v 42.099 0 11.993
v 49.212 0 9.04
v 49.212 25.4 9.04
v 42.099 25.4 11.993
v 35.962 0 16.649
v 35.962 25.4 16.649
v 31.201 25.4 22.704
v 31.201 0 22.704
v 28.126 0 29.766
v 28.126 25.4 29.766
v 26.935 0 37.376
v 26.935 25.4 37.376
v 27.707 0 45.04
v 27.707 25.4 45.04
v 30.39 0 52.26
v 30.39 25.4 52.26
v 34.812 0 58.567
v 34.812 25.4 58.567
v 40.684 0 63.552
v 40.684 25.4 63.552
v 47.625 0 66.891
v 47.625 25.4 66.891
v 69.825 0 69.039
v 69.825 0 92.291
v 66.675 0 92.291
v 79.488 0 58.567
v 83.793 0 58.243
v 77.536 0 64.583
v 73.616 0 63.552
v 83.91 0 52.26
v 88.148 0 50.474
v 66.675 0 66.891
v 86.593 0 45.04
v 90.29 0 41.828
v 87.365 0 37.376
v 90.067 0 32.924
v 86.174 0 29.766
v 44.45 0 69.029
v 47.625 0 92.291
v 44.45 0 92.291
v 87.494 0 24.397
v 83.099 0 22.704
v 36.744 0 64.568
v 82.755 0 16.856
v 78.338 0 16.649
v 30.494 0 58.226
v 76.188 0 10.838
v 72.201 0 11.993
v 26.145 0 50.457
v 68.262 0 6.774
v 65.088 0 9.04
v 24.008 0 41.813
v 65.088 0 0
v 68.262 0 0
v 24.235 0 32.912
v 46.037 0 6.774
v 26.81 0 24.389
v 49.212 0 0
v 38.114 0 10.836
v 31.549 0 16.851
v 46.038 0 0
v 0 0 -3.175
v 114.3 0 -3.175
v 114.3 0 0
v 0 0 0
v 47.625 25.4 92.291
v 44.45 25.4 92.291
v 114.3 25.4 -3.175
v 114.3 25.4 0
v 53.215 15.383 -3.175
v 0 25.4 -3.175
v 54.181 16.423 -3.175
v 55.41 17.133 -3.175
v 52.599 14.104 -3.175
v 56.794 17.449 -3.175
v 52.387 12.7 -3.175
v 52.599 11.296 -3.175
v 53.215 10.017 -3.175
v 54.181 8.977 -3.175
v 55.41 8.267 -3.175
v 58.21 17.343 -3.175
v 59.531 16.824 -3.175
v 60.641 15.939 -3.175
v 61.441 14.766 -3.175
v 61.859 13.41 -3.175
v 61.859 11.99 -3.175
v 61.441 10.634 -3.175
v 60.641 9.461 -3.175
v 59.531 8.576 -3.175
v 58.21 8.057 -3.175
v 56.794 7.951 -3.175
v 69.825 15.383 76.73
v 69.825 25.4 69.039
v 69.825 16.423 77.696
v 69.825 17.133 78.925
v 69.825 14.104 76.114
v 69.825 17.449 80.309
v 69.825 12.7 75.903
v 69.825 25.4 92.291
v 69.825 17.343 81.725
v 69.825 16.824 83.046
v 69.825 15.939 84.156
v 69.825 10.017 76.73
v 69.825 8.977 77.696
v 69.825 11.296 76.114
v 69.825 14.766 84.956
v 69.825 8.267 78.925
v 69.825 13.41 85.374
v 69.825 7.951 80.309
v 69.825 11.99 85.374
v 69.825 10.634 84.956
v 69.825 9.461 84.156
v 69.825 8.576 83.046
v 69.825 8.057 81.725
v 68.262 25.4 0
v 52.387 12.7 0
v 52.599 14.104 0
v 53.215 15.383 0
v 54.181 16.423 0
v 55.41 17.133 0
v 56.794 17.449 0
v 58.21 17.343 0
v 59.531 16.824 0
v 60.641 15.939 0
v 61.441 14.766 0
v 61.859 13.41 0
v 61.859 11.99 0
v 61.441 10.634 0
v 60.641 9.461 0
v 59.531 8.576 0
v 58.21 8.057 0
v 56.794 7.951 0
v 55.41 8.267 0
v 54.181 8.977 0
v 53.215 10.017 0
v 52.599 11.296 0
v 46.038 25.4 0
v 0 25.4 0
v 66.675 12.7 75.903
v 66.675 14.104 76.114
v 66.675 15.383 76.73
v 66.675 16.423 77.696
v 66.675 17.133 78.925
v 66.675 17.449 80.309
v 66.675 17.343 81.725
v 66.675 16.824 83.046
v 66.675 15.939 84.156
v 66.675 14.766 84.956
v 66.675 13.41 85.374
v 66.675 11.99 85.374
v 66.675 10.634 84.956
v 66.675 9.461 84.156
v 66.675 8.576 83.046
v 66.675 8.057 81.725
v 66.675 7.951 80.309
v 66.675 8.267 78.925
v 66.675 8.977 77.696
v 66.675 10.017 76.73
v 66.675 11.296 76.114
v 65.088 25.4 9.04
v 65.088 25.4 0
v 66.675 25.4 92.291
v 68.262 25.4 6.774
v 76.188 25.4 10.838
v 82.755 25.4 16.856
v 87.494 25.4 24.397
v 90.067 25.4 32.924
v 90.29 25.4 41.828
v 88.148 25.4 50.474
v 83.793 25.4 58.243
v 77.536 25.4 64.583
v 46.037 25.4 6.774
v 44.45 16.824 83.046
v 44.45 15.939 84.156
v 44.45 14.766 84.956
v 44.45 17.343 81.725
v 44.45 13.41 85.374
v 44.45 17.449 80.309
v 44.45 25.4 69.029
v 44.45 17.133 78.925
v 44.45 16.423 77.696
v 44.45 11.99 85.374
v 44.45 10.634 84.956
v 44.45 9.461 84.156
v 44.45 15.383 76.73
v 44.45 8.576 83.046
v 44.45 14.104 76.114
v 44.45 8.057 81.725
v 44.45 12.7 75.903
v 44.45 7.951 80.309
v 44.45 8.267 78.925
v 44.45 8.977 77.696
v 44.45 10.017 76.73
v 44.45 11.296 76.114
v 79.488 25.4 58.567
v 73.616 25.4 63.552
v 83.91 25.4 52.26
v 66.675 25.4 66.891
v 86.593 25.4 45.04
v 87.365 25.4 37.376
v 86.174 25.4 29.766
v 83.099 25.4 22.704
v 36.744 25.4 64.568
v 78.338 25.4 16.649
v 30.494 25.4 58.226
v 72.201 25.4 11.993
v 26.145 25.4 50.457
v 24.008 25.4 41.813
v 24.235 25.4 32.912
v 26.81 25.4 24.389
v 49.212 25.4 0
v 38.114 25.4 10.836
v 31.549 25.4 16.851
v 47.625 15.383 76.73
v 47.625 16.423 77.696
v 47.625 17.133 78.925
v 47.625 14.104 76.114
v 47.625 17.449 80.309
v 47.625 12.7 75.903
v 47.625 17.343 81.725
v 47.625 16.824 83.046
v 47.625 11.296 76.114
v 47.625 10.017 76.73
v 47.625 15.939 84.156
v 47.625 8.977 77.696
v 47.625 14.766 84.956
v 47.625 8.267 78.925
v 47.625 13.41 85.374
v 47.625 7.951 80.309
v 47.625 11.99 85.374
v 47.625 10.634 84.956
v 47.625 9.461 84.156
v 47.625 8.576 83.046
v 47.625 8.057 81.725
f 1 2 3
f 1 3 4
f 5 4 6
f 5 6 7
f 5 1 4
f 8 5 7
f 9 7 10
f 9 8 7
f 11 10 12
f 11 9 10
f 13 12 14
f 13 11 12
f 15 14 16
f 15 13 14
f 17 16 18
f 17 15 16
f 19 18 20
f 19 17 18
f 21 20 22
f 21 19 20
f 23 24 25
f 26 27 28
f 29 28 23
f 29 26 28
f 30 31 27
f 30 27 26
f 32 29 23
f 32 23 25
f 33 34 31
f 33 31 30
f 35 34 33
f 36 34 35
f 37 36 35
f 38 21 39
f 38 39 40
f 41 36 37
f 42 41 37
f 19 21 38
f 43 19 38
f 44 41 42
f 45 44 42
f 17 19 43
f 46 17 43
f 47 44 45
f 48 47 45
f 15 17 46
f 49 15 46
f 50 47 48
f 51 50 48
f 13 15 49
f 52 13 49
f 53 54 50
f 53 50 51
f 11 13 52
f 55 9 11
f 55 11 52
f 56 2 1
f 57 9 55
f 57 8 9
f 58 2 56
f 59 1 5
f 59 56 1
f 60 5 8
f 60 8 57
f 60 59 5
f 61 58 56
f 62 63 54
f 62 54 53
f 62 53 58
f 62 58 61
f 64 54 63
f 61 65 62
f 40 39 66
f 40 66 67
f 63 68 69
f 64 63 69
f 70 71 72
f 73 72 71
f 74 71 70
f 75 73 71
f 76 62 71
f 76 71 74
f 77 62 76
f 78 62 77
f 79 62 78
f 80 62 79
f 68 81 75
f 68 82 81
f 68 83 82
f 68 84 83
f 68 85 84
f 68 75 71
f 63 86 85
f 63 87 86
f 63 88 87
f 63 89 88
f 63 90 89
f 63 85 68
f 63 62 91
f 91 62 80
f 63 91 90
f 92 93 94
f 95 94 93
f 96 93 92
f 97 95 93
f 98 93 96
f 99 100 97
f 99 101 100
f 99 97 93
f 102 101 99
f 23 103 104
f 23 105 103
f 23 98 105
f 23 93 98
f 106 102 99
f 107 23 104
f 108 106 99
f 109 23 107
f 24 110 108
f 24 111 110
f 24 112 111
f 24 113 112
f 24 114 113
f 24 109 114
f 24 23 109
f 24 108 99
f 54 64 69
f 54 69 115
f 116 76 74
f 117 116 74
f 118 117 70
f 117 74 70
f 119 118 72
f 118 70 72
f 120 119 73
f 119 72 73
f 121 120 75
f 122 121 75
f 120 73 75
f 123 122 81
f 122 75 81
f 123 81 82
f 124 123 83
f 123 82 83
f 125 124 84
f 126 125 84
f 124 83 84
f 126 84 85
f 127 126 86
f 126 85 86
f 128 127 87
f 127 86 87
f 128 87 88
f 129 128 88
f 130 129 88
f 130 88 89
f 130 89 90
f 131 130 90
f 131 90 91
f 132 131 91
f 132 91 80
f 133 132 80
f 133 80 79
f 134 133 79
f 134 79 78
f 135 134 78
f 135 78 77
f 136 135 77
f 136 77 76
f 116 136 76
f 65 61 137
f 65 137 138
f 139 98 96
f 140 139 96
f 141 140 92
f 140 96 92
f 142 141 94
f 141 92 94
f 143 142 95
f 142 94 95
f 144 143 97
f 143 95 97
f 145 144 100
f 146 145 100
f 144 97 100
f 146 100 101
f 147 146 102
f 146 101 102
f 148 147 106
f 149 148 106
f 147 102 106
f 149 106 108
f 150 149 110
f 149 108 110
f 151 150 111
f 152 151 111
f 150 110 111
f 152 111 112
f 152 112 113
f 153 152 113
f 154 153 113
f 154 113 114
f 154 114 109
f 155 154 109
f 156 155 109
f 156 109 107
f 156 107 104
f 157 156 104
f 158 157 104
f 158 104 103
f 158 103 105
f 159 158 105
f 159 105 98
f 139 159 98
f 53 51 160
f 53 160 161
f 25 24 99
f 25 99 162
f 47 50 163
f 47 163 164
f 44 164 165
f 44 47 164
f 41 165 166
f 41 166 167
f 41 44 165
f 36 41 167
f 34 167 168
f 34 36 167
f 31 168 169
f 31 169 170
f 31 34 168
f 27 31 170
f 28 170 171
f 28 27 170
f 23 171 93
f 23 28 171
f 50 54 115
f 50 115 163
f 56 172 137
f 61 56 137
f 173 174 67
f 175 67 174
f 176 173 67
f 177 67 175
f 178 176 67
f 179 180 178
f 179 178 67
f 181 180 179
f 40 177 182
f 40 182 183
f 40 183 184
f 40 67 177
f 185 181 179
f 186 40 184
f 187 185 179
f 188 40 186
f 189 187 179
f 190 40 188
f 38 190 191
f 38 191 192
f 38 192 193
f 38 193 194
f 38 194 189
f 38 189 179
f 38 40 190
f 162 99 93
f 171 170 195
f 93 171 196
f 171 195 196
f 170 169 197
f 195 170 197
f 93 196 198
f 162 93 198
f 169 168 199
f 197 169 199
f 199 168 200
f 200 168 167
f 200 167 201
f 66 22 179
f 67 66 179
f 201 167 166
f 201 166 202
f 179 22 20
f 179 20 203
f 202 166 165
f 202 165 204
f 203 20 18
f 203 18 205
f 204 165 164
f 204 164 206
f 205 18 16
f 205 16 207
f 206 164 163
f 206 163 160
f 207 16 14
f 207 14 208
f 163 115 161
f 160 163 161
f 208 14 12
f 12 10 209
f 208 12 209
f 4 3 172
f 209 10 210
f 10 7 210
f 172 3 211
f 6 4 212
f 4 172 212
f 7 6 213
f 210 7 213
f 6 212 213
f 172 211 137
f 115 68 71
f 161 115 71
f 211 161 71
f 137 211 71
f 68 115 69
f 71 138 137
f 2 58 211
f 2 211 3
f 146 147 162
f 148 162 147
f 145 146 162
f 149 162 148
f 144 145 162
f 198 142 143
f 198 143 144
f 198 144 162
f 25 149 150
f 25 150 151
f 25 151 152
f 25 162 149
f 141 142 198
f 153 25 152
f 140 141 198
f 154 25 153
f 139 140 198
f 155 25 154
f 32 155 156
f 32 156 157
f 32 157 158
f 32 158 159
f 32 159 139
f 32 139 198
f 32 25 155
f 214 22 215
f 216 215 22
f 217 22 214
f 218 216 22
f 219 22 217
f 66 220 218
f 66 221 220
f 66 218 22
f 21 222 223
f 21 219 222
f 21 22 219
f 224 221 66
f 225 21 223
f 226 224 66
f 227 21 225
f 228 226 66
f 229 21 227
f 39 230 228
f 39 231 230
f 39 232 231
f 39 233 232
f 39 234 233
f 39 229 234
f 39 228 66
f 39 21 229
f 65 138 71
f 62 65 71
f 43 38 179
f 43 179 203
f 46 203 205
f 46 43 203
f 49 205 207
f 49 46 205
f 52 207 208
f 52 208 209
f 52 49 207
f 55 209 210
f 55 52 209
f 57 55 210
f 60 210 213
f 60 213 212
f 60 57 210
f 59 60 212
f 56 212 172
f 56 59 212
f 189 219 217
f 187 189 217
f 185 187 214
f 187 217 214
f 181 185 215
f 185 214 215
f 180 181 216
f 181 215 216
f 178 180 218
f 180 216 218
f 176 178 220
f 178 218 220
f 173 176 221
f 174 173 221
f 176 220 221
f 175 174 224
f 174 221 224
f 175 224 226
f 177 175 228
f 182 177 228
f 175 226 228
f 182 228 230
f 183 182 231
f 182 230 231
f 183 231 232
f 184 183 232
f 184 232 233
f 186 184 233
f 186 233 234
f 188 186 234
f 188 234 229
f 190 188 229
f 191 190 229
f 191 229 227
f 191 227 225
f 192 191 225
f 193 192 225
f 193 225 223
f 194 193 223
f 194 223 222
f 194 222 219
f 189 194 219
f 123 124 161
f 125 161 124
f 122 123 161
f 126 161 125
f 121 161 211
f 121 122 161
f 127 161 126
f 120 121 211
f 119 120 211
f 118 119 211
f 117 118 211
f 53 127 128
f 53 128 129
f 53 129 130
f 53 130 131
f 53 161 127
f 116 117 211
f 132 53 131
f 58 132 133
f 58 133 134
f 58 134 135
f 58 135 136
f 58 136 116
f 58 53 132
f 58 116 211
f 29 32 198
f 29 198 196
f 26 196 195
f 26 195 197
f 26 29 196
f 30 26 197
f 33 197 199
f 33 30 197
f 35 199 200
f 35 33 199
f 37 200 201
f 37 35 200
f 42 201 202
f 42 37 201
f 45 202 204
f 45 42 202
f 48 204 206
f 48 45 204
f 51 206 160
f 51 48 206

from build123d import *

# Parameters (mm, degrees)
BOSS_EXTRUDE1_DEPTH = 25.4
SKETCH2_R           = 4.7625
CUT_EXTRUDE1_DEPTH  = 25.4
SKETCH3_R           = 4.7625
CUT_EXTRUDE2_DEPTH  = 25.4


with BuildPart() as part:
    # Sketch1 → Boss-Extrude1 (new body)
    with BuildSketch(Plane(origin=(0, 0, 0), x_dir=(1, 0, 0), z_dir=(0, 1, 0))):
        with BuildLine():
            Line((0, 0), (0, 3.175))
            Line((0, 3.175), (114.3, 3.175))
            Line((114.3, 3.175), (114.3, 0))
            Line((114.3, 0), (68.2625, 0))
            Line((68.2625, 0), (68.2625, -6.774088247))
            ThreePointArc((68.2625, -6.774088247), (90.477013576, -37.368879188), (69.8246, -69.03911221))
            Line((69.8246, -69.03911221), (69.8246, -92.290964713))
            Line((69.8246, -92.290964713), (66.675, -92.290964713))
            Line((66.675, -92.290964713), (66.675, -66.890964713))
            ThreePointArc((66.675, -66.890964713), (87.364626112, -37.37586168), (65.0875, -9.03981418))
            Line((65.0875, -9.03981418), (65.0875, 0))
            Line((65.0875, 0), (49.2125, 0))
            Line((49.2125, 0), (49.2125, -9.03981418))
            ThreePointArc((49.2125, -9.03981418), (26.935373888, -37.37586168), (47.625, -66.890964713))
            Line((47.625, -66.890964713), (47.625, -92.290964713))
            Line((47.625, -92.290964713), (44.45, -92.290964713))
            Line((44.45, -92.290964713), (44.45, -69.028659115))
            ThreePointArc((44.45, -69.028659115), (23.823333687, -37.35515016), (46.0375, -6.774088247))
            Line((46.0375, -6.774088247), (46.0375, 0))
            Line((46.0375, 0), (0, 0))
        make_face()
    extrude(amount=BOSS_EXTRUDE1_DEPTH)

    # Sketch2 → Cut-Extrude1 (cut)
    with BuildSketch(Plane(origin=(69.8246, 0, 0), x_dir=(0, 0, -1), z_dir=(1, 0, 0))):
        with Locations((-80.665038461, 12.7)):
            Circle(SKETCH2_R)
    extrude(amount=-CUT_EXTRUDE1_DEPTH, mode=Mode.SUBTRACT)

    # Sketch3 → Cut-Extrude2 (cut)
    with BuildSketch(Plane(origin=(0, 0, -3.175), x_dir=(-1, 0, 0), z_dir=(0, 0, -1))):
        with Locations((-57.15, 12.7)):
            Circle(SKETCH3_R)
    extrude(amount=-CUT_EXTRUDE2_DEPTH, mode=Mode.SUBTRACT)


solid = part.part
